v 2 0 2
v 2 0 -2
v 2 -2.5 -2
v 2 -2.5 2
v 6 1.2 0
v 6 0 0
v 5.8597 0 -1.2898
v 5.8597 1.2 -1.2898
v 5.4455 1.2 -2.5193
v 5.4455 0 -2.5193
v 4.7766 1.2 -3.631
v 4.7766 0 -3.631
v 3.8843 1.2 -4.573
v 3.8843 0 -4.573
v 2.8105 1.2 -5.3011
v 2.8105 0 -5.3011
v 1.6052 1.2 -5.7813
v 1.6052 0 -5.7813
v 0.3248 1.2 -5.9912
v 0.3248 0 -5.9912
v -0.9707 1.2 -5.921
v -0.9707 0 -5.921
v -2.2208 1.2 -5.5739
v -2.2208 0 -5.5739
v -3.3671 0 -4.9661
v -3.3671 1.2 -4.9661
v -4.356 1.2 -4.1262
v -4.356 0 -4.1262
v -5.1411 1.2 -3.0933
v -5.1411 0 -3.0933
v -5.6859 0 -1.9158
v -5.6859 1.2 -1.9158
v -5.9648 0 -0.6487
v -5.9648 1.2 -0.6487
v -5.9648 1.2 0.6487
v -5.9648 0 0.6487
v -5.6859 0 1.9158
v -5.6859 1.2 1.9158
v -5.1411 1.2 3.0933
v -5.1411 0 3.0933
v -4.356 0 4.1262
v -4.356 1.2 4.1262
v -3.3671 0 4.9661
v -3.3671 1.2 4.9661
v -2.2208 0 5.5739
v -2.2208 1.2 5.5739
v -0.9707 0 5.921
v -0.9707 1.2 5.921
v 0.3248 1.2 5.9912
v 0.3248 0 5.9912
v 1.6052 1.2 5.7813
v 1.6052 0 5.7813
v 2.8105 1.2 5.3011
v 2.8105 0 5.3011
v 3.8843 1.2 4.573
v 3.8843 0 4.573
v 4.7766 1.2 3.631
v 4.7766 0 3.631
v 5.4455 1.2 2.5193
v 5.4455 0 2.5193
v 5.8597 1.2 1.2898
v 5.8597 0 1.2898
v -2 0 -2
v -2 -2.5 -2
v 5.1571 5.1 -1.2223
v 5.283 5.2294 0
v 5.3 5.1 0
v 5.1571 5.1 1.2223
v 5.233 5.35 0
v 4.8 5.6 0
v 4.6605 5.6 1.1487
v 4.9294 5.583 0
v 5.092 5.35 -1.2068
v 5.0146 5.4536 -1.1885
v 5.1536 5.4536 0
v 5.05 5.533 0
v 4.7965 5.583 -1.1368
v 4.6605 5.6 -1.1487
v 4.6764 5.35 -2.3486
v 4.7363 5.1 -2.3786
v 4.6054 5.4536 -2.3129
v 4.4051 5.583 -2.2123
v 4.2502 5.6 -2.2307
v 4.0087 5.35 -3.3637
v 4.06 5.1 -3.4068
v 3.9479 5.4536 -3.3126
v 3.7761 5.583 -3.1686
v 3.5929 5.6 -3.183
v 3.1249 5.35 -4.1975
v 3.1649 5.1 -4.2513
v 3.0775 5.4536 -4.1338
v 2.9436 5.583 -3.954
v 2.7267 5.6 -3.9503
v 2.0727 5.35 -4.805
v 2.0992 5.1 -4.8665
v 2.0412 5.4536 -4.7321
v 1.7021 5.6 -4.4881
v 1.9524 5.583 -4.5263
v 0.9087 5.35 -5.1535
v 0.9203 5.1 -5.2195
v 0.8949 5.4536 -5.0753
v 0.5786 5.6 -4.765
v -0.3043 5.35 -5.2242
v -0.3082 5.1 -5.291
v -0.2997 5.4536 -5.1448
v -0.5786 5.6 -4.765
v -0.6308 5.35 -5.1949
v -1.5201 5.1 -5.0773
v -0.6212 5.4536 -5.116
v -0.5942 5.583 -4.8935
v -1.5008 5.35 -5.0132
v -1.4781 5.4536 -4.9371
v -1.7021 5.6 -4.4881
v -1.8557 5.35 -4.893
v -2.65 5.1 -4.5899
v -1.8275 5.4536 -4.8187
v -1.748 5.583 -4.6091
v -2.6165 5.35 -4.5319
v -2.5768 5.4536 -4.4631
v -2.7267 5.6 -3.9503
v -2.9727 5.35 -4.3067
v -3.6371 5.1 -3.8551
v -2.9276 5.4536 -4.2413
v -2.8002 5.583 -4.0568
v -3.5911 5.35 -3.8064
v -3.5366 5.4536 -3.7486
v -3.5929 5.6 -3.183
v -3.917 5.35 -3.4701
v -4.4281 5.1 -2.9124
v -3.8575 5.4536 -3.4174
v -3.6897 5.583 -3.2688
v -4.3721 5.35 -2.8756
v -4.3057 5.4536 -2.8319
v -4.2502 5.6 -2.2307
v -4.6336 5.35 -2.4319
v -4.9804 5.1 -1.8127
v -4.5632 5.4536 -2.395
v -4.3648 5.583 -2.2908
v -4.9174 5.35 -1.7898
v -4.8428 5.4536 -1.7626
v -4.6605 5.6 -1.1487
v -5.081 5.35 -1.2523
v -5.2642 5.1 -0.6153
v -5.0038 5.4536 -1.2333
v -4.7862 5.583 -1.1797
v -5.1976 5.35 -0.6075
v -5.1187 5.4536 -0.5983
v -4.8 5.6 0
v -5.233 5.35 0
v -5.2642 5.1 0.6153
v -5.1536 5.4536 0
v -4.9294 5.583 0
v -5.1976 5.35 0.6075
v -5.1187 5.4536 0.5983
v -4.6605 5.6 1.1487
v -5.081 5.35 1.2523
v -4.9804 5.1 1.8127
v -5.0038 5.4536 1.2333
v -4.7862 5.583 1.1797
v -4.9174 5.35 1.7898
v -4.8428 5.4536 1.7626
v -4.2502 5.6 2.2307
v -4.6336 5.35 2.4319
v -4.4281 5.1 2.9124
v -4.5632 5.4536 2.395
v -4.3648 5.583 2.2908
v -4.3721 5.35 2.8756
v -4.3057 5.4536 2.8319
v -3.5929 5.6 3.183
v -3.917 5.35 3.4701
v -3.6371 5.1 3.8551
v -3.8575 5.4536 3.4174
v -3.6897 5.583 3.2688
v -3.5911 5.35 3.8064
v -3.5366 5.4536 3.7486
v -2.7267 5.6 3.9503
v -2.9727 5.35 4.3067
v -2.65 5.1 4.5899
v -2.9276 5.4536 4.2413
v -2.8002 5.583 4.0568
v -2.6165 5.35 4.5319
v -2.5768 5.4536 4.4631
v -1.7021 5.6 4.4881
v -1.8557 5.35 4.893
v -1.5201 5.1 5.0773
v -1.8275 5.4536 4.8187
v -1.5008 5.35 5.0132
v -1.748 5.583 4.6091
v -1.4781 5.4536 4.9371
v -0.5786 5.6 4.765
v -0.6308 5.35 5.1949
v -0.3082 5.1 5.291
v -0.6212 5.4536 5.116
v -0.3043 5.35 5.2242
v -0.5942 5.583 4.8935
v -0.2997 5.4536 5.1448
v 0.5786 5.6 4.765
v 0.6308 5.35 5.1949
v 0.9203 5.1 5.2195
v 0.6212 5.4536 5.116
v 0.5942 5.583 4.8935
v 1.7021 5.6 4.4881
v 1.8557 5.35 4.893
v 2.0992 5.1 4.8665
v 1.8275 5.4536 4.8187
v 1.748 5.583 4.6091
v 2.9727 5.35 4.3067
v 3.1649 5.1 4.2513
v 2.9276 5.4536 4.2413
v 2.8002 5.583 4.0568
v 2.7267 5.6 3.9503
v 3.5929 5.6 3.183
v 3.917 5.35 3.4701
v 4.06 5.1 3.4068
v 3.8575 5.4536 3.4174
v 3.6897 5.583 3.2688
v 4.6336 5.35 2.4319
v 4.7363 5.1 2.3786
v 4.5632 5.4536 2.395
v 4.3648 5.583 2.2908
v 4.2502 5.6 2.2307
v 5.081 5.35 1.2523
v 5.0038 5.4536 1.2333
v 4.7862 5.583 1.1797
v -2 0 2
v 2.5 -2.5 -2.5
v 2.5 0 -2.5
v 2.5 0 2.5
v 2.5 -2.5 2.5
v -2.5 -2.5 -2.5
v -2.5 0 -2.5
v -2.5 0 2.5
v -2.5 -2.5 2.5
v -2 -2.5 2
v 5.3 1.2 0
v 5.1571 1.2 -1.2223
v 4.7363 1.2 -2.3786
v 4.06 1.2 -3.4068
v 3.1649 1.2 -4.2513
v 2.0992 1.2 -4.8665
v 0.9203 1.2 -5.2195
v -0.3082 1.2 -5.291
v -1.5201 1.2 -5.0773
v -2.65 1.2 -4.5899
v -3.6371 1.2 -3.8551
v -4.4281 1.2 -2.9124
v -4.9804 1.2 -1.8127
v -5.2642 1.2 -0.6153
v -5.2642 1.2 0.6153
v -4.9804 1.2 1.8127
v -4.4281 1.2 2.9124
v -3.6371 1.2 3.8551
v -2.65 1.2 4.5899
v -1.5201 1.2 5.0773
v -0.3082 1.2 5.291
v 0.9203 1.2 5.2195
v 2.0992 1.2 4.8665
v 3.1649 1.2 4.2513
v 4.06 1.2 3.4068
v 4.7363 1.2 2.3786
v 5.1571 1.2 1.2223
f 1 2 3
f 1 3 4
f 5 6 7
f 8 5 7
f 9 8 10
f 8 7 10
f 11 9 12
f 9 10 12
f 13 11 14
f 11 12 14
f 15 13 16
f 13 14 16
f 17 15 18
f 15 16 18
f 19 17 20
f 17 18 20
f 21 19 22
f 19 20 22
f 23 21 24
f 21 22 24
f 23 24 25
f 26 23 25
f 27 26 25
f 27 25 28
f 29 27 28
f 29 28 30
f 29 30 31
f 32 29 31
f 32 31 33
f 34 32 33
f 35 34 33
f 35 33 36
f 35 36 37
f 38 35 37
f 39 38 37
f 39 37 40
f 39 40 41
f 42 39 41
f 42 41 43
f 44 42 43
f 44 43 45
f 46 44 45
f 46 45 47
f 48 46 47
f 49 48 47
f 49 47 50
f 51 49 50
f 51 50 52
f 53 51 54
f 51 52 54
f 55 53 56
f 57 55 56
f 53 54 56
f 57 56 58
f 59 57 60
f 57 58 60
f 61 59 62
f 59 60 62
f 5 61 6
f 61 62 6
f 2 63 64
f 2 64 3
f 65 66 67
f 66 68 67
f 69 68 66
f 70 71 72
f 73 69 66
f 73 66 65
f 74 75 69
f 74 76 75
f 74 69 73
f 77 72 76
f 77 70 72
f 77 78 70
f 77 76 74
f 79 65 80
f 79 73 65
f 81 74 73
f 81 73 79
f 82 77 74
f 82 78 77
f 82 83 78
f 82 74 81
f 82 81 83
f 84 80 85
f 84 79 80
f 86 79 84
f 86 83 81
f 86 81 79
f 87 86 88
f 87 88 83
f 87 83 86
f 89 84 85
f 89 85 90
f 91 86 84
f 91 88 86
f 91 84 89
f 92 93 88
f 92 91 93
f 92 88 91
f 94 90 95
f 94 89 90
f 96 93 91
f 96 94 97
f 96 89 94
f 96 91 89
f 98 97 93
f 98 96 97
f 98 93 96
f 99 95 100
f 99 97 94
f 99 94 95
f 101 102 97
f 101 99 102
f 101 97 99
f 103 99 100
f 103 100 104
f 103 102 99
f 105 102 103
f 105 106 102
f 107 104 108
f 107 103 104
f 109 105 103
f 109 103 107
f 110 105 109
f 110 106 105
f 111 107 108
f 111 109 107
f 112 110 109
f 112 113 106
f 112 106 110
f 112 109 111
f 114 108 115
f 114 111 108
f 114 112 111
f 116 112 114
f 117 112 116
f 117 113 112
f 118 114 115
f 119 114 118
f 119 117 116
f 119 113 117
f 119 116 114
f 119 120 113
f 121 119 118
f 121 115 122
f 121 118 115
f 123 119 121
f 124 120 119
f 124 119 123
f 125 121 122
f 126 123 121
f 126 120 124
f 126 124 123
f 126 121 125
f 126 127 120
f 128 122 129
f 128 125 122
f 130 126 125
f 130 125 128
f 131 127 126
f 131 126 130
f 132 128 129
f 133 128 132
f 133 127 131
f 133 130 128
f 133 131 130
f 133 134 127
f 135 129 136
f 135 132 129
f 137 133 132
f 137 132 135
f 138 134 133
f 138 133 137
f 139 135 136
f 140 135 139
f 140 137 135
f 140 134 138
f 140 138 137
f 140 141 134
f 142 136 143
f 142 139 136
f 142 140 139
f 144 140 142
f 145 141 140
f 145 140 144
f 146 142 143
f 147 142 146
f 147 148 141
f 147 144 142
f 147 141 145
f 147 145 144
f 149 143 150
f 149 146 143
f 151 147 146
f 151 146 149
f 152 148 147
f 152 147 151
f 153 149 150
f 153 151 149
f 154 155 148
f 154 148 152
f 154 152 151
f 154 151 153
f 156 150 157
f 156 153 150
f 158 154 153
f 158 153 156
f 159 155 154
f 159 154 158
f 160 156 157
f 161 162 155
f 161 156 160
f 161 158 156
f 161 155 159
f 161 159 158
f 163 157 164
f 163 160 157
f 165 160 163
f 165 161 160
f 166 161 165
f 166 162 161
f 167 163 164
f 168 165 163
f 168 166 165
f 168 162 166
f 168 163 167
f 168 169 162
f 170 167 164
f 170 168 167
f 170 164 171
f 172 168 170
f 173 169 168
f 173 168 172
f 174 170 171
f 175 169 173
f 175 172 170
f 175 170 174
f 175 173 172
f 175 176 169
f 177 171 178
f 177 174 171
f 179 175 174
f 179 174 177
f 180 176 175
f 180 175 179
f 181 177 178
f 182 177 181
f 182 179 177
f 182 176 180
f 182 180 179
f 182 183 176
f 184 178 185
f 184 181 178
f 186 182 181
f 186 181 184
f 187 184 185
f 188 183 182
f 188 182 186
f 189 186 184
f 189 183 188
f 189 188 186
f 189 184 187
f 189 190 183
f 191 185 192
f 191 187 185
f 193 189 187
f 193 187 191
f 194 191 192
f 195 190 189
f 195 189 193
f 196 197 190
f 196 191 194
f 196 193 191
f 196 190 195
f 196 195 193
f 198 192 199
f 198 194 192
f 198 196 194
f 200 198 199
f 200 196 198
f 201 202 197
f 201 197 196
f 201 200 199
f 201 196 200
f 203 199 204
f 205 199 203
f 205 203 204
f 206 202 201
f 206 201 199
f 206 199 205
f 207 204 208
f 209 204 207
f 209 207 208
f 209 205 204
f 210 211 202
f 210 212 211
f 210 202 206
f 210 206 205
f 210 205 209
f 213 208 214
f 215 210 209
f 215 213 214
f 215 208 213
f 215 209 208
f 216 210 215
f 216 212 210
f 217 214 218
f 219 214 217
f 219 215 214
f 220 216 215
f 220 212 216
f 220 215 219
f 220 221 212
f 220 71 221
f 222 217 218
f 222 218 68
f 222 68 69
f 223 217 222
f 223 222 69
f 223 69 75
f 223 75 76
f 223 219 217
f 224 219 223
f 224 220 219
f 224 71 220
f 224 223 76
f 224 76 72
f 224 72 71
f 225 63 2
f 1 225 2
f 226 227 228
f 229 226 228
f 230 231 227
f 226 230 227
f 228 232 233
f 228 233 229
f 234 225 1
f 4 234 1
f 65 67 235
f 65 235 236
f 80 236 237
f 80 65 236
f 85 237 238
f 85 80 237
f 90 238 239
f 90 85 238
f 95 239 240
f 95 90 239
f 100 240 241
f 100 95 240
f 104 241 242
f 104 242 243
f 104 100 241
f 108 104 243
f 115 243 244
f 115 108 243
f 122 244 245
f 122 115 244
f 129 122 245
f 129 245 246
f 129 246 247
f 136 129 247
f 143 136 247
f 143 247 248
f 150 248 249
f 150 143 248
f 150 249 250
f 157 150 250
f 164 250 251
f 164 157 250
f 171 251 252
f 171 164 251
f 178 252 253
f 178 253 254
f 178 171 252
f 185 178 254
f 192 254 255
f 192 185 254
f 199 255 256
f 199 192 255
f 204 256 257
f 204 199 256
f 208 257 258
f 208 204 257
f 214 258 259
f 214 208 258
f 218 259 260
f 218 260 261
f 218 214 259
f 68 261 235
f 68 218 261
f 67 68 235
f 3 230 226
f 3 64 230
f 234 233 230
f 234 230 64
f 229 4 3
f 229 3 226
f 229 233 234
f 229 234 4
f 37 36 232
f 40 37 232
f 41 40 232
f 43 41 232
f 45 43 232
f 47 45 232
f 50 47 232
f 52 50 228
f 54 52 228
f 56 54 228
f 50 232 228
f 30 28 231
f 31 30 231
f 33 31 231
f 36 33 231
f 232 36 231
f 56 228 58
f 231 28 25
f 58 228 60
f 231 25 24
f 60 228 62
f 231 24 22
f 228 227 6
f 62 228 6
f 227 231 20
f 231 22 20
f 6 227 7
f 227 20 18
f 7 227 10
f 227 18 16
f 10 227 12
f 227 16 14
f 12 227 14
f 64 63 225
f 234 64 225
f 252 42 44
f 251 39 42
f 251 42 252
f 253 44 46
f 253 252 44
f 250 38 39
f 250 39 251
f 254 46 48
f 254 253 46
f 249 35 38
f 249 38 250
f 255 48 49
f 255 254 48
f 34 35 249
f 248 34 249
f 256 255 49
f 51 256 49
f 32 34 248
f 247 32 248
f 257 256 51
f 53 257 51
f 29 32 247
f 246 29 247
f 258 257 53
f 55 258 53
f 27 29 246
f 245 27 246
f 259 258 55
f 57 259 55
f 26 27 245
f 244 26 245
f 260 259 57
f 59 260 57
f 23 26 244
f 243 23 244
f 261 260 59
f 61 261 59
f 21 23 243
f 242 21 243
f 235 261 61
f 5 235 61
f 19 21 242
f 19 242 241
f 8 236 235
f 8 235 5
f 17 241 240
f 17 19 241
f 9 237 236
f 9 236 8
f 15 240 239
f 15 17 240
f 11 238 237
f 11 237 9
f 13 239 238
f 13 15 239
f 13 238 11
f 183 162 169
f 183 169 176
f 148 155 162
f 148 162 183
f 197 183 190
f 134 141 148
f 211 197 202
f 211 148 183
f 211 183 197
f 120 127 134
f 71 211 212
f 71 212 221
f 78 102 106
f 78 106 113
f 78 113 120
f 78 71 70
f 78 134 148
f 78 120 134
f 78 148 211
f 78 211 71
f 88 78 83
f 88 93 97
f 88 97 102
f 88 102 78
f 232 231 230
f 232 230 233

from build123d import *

# Parameters (mm, degrees)
SKETCH2_R           = 6
BOSS_EXTRUDE1_DEPTH = 5.6
SKETCH3_R           = 6
SKETCH3_R_2         = 5.3
CUT_EXTRUDE1_DEPTH  = 4.4
FILLET1_R           = 0.5
SKETCH4_W           = 5
SKETCH4_H           = 5
SKETCH4_W_2         = 4
SKETCH4_H_2         = 4
BOSS_EXTRUDE2_DEPTH = 2.5


with BuildPart() as part:
    # Sketch2 → Boss-Extrude1 (new body)
    with BuildSketch(Plane(origin=(0, 0, 0), x_dir=(1, 0, 0), z_dir=(0, 1, 0))):
        Circle(SKETCH2_R)
    extrude(amount=BOSS_EXTRUDE1_DEPTH)

    # Sketch3 → Cut-Extrude1 (cut)
    with BuildSketch(Plane(origin=(0, 5.6, 0), x_dir=(1, 0, 0), z_dir=(0, 1, 0))):
        Circle(SKETCH3_R)
        Circle(SKETCH3_R_2, mode=Mode.SUBTRACT)
    extrude(amount=-CUT_EXTRUDE1_DEPTH, mode=Mode.SUBTRACT)

    # Fillet1
    fillet1_edges = [part.edges().sort_by_distance(p)[0] for p in [
        (-5.3, 5.6, 0),
    ]]
    fillet(fillet1_edges, radius=FILLET1_R)

    # Sketch4 → Boss-Extrude2 (add)
    with BuildSketch(Plane.XZ):
        Rectangle(SKETCH4_W, SKETCH4_H)
        Rectangle(SKETCH4_W_2, SKETCH4_H_2, mode=Mode.SUBTRACT)
    extrude(amount=BOSS_EXTRUDE2_DEPTH)


solid = part.part
